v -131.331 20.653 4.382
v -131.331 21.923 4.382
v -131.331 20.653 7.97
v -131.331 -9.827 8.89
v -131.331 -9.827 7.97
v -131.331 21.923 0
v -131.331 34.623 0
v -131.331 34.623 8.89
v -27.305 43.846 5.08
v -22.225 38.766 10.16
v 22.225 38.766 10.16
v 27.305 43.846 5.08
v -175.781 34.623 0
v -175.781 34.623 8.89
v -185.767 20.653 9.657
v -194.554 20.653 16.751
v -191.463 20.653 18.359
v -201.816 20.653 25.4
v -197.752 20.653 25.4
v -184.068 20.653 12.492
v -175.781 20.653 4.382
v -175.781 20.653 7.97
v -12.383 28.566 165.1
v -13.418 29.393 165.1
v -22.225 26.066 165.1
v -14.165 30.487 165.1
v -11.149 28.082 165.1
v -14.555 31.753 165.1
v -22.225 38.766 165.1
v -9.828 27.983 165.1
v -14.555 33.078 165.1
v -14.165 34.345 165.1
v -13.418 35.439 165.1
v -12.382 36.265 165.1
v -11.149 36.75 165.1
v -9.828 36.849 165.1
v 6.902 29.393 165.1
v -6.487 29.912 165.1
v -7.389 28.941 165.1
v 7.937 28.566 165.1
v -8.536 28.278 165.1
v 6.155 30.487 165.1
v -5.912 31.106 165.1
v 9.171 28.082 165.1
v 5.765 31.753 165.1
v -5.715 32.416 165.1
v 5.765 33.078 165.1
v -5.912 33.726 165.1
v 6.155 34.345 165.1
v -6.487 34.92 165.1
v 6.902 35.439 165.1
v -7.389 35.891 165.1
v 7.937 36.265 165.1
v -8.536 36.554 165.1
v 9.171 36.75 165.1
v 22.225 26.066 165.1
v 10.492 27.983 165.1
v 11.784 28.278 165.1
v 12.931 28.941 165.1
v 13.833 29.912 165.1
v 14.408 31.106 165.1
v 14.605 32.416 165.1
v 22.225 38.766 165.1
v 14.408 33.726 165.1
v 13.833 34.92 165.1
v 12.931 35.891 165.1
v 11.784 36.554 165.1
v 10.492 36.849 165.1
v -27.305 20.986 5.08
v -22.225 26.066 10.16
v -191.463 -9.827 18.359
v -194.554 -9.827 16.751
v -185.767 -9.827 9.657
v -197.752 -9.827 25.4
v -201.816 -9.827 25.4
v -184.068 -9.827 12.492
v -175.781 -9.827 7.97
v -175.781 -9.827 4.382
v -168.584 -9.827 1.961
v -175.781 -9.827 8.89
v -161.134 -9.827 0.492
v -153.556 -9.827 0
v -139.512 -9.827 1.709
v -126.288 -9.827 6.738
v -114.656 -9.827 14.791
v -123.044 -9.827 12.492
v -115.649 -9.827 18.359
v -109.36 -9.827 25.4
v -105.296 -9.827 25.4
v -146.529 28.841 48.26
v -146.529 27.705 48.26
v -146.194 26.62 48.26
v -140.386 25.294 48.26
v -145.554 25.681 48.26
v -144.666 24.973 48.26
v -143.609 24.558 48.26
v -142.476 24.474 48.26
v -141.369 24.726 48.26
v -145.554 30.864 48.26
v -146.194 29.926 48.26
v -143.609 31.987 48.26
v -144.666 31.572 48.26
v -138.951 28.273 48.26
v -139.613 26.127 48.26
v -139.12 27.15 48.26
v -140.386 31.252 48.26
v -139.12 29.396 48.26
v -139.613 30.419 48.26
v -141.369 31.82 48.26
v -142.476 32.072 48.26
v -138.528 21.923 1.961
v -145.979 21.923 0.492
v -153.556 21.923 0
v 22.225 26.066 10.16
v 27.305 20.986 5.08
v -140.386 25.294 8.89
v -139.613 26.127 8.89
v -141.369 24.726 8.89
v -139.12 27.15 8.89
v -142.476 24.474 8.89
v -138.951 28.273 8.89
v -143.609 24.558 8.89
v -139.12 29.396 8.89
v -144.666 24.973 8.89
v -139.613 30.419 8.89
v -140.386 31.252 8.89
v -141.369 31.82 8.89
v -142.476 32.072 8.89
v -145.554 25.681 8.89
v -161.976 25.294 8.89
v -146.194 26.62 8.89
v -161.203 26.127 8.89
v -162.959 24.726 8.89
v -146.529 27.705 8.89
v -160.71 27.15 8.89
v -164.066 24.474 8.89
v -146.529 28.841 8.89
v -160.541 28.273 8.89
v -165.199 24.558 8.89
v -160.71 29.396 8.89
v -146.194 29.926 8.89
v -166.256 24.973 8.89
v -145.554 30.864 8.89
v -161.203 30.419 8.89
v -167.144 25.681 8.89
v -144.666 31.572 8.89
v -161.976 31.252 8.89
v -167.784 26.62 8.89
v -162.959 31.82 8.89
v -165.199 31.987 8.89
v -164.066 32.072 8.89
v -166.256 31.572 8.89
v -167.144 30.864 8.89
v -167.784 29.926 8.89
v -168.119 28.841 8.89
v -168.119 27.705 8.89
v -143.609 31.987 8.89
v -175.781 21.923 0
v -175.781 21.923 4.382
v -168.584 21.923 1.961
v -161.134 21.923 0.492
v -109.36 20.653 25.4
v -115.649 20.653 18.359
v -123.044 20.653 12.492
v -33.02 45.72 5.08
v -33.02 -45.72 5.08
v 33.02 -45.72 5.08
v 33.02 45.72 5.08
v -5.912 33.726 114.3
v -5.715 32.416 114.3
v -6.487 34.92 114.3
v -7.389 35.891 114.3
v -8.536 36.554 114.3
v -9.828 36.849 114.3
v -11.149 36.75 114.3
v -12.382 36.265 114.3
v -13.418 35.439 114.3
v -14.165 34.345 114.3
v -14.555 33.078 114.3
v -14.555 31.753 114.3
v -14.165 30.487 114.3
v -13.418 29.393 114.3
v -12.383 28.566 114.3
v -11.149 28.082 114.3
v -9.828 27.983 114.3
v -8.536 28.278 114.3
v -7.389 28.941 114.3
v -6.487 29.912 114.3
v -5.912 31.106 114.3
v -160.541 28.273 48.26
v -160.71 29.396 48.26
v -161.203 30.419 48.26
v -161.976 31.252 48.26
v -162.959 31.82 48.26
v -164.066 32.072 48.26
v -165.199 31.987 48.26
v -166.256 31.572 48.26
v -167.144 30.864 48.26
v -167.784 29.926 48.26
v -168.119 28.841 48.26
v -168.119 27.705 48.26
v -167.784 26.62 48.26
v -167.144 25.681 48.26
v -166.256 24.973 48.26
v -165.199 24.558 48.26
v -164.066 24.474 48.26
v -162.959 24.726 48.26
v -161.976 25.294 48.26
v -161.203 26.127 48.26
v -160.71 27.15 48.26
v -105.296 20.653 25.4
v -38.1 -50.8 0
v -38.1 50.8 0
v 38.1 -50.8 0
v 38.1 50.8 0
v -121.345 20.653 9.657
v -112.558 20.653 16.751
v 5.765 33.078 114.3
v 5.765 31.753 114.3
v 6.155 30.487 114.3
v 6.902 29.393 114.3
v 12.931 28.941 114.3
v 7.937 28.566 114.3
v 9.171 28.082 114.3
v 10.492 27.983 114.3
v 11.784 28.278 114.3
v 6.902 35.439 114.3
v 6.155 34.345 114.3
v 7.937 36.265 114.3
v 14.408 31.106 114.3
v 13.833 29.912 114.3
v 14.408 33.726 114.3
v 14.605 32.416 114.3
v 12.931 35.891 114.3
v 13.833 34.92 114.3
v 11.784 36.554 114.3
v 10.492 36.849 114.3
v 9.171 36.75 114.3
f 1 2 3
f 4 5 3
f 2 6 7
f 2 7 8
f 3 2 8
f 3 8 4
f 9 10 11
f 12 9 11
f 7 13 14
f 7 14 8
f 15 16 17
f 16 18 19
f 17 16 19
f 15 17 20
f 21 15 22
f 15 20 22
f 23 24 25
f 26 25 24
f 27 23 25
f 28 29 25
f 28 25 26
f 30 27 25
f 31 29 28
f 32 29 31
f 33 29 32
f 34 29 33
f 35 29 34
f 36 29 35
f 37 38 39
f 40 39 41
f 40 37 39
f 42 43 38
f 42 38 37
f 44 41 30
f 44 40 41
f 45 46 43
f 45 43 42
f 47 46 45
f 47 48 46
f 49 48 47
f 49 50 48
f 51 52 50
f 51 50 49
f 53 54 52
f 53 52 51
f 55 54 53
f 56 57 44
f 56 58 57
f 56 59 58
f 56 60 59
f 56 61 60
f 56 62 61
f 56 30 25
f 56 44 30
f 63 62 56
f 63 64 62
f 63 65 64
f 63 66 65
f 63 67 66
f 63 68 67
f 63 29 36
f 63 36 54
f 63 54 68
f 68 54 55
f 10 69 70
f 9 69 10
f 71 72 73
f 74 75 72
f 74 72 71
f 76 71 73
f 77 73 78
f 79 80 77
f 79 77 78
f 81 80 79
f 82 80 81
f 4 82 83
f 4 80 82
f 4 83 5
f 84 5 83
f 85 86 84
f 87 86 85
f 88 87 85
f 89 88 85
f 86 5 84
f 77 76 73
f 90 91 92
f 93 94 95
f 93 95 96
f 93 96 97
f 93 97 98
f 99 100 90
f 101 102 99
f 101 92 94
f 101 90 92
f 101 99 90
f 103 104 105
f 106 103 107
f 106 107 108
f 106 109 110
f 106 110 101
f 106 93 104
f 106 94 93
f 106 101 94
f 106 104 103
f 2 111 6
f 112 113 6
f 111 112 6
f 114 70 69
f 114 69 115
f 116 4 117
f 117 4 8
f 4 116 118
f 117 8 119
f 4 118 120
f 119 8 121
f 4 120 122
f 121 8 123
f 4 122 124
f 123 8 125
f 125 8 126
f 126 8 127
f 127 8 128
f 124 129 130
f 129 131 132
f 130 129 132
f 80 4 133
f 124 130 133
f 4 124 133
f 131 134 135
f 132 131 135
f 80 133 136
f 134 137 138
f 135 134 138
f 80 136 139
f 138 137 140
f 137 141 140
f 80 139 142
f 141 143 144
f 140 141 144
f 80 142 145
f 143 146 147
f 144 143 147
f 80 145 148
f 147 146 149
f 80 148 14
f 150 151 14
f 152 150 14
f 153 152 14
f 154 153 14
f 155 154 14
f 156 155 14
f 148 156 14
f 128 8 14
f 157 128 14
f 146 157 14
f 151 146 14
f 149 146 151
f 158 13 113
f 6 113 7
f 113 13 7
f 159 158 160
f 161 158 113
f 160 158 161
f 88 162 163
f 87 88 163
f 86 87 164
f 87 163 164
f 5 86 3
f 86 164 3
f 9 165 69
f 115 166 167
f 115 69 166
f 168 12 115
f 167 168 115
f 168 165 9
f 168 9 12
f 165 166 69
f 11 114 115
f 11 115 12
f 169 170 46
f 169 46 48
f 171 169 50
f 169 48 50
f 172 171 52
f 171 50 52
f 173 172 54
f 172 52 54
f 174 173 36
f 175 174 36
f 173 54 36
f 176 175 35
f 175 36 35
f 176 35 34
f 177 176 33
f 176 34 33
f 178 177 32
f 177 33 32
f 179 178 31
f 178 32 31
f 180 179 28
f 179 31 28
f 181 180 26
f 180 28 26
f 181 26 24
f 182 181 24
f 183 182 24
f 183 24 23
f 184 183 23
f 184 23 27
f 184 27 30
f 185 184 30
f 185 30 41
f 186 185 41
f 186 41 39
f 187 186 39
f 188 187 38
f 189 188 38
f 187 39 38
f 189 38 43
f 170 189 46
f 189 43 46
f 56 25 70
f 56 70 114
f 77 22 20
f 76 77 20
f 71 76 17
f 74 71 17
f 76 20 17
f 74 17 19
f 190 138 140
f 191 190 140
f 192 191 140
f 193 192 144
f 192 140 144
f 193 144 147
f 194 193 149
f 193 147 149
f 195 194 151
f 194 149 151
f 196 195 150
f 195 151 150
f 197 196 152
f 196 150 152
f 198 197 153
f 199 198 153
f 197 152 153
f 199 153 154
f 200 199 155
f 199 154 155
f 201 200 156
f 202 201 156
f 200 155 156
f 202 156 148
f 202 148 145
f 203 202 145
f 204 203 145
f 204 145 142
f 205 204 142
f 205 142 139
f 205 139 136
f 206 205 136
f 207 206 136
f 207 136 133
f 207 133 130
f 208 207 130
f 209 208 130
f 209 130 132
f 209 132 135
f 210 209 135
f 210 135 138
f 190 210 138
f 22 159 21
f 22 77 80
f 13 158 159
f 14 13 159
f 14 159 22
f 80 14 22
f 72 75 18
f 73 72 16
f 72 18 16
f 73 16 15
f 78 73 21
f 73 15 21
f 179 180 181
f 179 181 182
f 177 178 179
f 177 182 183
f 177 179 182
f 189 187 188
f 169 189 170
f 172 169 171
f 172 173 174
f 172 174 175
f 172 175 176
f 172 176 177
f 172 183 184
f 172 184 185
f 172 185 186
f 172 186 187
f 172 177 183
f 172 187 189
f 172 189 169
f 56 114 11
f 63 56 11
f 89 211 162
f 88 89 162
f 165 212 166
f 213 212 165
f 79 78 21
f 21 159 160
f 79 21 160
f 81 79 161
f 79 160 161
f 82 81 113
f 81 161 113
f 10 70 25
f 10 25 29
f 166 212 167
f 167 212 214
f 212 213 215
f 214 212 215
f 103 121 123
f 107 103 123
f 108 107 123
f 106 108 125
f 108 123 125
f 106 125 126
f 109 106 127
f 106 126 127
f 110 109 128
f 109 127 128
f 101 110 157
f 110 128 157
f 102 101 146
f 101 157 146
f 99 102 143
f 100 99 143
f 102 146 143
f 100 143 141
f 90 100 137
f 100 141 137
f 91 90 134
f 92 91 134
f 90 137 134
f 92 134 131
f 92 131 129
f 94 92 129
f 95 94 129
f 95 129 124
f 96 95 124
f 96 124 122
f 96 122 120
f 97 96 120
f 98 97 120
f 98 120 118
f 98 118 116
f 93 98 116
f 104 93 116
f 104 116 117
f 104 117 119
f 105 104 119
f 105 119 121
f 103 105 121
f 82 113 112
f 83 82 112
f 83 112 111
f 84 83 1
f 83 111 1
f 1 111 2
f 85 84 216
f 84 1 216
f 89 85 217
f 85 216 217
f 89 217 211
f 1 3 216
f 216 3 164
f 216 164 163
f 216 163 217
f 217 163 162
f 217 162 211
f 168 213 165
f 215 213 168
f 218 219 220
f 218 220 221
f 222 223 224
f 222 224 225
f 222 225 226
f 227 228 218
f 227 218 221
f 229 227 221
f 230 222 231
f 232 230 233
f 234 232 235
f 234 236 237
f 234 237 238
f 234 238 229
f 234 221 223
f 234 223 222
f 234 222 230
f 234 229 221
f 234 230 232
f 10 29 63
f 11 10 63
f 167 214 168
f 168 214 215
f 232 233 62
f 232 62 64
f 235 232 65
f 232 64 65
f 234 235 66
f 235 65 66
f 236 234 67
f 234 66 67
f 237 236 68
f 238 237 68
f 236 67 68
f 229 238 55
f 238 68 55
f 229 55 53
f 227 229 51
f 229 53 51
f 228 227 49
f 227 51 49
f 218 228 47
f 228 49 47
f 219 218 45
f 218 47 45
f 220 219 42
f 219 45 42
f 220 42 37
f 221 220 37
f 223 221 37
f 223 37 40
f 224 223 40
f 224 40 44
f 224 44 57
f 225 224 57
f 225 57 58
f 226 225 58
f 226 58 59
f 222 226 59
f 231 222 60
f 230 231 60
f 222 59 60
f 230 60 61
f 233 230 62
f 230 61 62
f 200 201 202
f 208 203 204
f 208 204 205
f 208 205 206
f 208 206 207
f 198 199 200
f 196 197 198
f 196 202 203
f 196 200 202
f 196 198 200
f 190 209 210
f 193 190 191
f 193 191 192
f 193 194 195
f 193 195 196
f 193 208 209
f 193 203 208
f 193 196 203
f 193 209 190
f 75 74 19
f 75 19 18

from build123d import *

# Parameters (mm, degrees)
F0_W      = 76.2
F0_H      = 101.6
F0_W_2    = 44.45
F0_H_2    = 12.7
F1_DEPTH  = 5.08
F2_DEPTH  = 165.1
F3_R      = 4.445
F4_DEPTH  = 50.8
F5_W      = 44.45
F5_H      = 12.7
F5_R      = 3.81
F6_DEPTH  = 8.89
F7_DEPTH  = 48.26
F9_DEPTH  = 31.75
F10_DEPTH = 1.27
F11_SIZE  = 5.07999


# Not quite as in the source:
# - a fillet or chamfer is up to 0.001 mm smaller than in the source, because OpenCascade refuses the exact size


with BuildPart() as f1:
    # F0 (on Top) → F1 (new body)
    with BuildSketch(Plane.XY):
        Rectangle(F0_W, F0_H)
        with Locations((0, 32.4159748852)):
            Rectangle(F0_W_2, F0_H_2, mode=Mode.SUBTRACT)
    extrude(amount=F1_DEPTH)

    # F0 (on Top) → F2 (join)
    with BuildSketch(Plane.XY):
        with Locations((0, 32.4159748852)):
            Rectangle(F0_W_2, F0_H_2)
    extrude(amount=F2_DEPTH)

    # F3 (on face) → F4 (cut)
    with BuildSketch(Plane.XY.offset(165.1)):
        with Locations((-10.16, 32.4159748852)):
            Circle(F3_R)
        with Locations((10.16, 32.4159748852)):
            Circle(F3_R)
    extrude(amount=-F4_DEPTH, mode=Mode.SUBTRACT)

    # F11 (size 5.08 in the source; OpenCascade refuses exactly that, so slightly less here)
    f11_edges = [f1.edges().sort_by_distance(p)[0] for p in [
        (38.1, 0, 5.08),
        (0, 50.8, 5.08),
        (-38.1, 0, 5.08),
        (0, -50.8, 5.08),
        (22.225, 32.415975, 5.08),
        (0, 26.065975, 5.08),
        (-22.225, 32.415975, 5.08),
        (0, 38.765975, 5.08),
    ]]
    chamfer(f11_edges, length=F11_SIZE)


with BuildPart() as f6:
    # F5 (on Top) → F6 (new body)
    with BuildSketch(Plane.XY):
        with Locations((-153.5560860872, 28.2728751957)):
            Rectangle(F5_W, F5_H)
        with Locations((-164.3510860872, 28.2728751957)):
            Circle(F5_R, mode=Mode.SUBTRACT)
        with Locations((-142.7610860872, 28.2728751957)):
            Circle(F5_R, mode=Mode.SUBTRACT)
    extrude(amount=F6_DEPTH)

    # F5 (on Top) → F7 (join)
    with BuildSketch(Plane.XY):
        with Locations((-164.3510860872, 28.2728751957)):
            Circle(F5_R)
        with Locations((-142.7610860872, 28.2728751957)):
            Circle(F5_R)
    extrude(amount=F7_DEPTH)

    # F8 (on face) → F9 (join)
    with BuildSketch(Plane.XZ.offset(-21.9228751957)):
        with BuildLine():
            Line((-175.7810860872, 7.9697383106), (-175.7810860872, 4.3824305473))
            ThreePointArc((-175.7810860872, 4.3824305473), (-164.8825631117, 1.1060553071), (-153.5560861917, 0))
            ThreePointArc((-153.5560861917, 0), (-142.2296091652, 1.1060552869), (-131.3310860872, 4.3824305473))
            Line((-131.3310860872, 4.3824305473), (-131.3310860872, 7.9697383106))
            ThreePointArc((-131.3310860872, 7.9697383106), (-153.5560860872, 3.302), (-175.7810860872, 7.9697383106))
        make_face()
        with BuildLine():
            Line((-105.2960860872, 25.4), (-109.3600860872, 25.4))
            ThreePointArc((-109.3600860872, 25.4), (-119.2211066073, 15.2674527622), (-131.3310860872, 7.9697383106))
            Line((-131.3310860872, 7.9697383106), (-131.3310860872, 4.3824305473))
            ThreePointArc((-131.3310860872, 4.3824305473), (-116.7801651243, 12.9917275683), (-105.2960860872, 25.4))
        make_face()
        with BuildLine():
            Line((-197.7520860872, 25.4), (-201.8160860872, 25.4))
            ThreePointArc((-201.8160860872, 25.4), (-190.3320070502, 12.9917275683), (-175.7810860872, 4.3824305473))
            Line((-175.7810860872, 4.3824305473), (-175.7810860872, 7.9697383106))
            ThreePointArc((-175.7810860872, 7.9697383106), (-187.8910655672, 15.2674527622), (-197.7520860872, 25.4))
        make_face()
        with BuildLine():
            Line((-175.7810860872, 8.89), (-175.7810860872, 7.9697383106))
            ThreePointArc((-175.7810860872, 7.9697383106), (-153.5560860872, 3.302), (-131.3310860872, 7.9697383106))
            Line((-131.3310860872, 7.9697383106), (-131.3310860872, 8.89))
            Line((-131.3310860872, 8.89), (-175.7810860872, 8.89))
        make_face()
    extrude(amount=F9_DEPTH)

    # F10 (cut): faces of the model
    f10_faces = [f6.faces().sort_by_distance(p)[0] for p in [
        (-118.407316074, 21.9228751957, 14.6525302176),
        (-188.7048561005, 21.9228751957, 14.6525302176),
    ]]
    extrude(f10_faces, amount=-F10_DEPTH, mode=Mode.SUBTRACT)


solid = Compound([f1.part, f6.part])
